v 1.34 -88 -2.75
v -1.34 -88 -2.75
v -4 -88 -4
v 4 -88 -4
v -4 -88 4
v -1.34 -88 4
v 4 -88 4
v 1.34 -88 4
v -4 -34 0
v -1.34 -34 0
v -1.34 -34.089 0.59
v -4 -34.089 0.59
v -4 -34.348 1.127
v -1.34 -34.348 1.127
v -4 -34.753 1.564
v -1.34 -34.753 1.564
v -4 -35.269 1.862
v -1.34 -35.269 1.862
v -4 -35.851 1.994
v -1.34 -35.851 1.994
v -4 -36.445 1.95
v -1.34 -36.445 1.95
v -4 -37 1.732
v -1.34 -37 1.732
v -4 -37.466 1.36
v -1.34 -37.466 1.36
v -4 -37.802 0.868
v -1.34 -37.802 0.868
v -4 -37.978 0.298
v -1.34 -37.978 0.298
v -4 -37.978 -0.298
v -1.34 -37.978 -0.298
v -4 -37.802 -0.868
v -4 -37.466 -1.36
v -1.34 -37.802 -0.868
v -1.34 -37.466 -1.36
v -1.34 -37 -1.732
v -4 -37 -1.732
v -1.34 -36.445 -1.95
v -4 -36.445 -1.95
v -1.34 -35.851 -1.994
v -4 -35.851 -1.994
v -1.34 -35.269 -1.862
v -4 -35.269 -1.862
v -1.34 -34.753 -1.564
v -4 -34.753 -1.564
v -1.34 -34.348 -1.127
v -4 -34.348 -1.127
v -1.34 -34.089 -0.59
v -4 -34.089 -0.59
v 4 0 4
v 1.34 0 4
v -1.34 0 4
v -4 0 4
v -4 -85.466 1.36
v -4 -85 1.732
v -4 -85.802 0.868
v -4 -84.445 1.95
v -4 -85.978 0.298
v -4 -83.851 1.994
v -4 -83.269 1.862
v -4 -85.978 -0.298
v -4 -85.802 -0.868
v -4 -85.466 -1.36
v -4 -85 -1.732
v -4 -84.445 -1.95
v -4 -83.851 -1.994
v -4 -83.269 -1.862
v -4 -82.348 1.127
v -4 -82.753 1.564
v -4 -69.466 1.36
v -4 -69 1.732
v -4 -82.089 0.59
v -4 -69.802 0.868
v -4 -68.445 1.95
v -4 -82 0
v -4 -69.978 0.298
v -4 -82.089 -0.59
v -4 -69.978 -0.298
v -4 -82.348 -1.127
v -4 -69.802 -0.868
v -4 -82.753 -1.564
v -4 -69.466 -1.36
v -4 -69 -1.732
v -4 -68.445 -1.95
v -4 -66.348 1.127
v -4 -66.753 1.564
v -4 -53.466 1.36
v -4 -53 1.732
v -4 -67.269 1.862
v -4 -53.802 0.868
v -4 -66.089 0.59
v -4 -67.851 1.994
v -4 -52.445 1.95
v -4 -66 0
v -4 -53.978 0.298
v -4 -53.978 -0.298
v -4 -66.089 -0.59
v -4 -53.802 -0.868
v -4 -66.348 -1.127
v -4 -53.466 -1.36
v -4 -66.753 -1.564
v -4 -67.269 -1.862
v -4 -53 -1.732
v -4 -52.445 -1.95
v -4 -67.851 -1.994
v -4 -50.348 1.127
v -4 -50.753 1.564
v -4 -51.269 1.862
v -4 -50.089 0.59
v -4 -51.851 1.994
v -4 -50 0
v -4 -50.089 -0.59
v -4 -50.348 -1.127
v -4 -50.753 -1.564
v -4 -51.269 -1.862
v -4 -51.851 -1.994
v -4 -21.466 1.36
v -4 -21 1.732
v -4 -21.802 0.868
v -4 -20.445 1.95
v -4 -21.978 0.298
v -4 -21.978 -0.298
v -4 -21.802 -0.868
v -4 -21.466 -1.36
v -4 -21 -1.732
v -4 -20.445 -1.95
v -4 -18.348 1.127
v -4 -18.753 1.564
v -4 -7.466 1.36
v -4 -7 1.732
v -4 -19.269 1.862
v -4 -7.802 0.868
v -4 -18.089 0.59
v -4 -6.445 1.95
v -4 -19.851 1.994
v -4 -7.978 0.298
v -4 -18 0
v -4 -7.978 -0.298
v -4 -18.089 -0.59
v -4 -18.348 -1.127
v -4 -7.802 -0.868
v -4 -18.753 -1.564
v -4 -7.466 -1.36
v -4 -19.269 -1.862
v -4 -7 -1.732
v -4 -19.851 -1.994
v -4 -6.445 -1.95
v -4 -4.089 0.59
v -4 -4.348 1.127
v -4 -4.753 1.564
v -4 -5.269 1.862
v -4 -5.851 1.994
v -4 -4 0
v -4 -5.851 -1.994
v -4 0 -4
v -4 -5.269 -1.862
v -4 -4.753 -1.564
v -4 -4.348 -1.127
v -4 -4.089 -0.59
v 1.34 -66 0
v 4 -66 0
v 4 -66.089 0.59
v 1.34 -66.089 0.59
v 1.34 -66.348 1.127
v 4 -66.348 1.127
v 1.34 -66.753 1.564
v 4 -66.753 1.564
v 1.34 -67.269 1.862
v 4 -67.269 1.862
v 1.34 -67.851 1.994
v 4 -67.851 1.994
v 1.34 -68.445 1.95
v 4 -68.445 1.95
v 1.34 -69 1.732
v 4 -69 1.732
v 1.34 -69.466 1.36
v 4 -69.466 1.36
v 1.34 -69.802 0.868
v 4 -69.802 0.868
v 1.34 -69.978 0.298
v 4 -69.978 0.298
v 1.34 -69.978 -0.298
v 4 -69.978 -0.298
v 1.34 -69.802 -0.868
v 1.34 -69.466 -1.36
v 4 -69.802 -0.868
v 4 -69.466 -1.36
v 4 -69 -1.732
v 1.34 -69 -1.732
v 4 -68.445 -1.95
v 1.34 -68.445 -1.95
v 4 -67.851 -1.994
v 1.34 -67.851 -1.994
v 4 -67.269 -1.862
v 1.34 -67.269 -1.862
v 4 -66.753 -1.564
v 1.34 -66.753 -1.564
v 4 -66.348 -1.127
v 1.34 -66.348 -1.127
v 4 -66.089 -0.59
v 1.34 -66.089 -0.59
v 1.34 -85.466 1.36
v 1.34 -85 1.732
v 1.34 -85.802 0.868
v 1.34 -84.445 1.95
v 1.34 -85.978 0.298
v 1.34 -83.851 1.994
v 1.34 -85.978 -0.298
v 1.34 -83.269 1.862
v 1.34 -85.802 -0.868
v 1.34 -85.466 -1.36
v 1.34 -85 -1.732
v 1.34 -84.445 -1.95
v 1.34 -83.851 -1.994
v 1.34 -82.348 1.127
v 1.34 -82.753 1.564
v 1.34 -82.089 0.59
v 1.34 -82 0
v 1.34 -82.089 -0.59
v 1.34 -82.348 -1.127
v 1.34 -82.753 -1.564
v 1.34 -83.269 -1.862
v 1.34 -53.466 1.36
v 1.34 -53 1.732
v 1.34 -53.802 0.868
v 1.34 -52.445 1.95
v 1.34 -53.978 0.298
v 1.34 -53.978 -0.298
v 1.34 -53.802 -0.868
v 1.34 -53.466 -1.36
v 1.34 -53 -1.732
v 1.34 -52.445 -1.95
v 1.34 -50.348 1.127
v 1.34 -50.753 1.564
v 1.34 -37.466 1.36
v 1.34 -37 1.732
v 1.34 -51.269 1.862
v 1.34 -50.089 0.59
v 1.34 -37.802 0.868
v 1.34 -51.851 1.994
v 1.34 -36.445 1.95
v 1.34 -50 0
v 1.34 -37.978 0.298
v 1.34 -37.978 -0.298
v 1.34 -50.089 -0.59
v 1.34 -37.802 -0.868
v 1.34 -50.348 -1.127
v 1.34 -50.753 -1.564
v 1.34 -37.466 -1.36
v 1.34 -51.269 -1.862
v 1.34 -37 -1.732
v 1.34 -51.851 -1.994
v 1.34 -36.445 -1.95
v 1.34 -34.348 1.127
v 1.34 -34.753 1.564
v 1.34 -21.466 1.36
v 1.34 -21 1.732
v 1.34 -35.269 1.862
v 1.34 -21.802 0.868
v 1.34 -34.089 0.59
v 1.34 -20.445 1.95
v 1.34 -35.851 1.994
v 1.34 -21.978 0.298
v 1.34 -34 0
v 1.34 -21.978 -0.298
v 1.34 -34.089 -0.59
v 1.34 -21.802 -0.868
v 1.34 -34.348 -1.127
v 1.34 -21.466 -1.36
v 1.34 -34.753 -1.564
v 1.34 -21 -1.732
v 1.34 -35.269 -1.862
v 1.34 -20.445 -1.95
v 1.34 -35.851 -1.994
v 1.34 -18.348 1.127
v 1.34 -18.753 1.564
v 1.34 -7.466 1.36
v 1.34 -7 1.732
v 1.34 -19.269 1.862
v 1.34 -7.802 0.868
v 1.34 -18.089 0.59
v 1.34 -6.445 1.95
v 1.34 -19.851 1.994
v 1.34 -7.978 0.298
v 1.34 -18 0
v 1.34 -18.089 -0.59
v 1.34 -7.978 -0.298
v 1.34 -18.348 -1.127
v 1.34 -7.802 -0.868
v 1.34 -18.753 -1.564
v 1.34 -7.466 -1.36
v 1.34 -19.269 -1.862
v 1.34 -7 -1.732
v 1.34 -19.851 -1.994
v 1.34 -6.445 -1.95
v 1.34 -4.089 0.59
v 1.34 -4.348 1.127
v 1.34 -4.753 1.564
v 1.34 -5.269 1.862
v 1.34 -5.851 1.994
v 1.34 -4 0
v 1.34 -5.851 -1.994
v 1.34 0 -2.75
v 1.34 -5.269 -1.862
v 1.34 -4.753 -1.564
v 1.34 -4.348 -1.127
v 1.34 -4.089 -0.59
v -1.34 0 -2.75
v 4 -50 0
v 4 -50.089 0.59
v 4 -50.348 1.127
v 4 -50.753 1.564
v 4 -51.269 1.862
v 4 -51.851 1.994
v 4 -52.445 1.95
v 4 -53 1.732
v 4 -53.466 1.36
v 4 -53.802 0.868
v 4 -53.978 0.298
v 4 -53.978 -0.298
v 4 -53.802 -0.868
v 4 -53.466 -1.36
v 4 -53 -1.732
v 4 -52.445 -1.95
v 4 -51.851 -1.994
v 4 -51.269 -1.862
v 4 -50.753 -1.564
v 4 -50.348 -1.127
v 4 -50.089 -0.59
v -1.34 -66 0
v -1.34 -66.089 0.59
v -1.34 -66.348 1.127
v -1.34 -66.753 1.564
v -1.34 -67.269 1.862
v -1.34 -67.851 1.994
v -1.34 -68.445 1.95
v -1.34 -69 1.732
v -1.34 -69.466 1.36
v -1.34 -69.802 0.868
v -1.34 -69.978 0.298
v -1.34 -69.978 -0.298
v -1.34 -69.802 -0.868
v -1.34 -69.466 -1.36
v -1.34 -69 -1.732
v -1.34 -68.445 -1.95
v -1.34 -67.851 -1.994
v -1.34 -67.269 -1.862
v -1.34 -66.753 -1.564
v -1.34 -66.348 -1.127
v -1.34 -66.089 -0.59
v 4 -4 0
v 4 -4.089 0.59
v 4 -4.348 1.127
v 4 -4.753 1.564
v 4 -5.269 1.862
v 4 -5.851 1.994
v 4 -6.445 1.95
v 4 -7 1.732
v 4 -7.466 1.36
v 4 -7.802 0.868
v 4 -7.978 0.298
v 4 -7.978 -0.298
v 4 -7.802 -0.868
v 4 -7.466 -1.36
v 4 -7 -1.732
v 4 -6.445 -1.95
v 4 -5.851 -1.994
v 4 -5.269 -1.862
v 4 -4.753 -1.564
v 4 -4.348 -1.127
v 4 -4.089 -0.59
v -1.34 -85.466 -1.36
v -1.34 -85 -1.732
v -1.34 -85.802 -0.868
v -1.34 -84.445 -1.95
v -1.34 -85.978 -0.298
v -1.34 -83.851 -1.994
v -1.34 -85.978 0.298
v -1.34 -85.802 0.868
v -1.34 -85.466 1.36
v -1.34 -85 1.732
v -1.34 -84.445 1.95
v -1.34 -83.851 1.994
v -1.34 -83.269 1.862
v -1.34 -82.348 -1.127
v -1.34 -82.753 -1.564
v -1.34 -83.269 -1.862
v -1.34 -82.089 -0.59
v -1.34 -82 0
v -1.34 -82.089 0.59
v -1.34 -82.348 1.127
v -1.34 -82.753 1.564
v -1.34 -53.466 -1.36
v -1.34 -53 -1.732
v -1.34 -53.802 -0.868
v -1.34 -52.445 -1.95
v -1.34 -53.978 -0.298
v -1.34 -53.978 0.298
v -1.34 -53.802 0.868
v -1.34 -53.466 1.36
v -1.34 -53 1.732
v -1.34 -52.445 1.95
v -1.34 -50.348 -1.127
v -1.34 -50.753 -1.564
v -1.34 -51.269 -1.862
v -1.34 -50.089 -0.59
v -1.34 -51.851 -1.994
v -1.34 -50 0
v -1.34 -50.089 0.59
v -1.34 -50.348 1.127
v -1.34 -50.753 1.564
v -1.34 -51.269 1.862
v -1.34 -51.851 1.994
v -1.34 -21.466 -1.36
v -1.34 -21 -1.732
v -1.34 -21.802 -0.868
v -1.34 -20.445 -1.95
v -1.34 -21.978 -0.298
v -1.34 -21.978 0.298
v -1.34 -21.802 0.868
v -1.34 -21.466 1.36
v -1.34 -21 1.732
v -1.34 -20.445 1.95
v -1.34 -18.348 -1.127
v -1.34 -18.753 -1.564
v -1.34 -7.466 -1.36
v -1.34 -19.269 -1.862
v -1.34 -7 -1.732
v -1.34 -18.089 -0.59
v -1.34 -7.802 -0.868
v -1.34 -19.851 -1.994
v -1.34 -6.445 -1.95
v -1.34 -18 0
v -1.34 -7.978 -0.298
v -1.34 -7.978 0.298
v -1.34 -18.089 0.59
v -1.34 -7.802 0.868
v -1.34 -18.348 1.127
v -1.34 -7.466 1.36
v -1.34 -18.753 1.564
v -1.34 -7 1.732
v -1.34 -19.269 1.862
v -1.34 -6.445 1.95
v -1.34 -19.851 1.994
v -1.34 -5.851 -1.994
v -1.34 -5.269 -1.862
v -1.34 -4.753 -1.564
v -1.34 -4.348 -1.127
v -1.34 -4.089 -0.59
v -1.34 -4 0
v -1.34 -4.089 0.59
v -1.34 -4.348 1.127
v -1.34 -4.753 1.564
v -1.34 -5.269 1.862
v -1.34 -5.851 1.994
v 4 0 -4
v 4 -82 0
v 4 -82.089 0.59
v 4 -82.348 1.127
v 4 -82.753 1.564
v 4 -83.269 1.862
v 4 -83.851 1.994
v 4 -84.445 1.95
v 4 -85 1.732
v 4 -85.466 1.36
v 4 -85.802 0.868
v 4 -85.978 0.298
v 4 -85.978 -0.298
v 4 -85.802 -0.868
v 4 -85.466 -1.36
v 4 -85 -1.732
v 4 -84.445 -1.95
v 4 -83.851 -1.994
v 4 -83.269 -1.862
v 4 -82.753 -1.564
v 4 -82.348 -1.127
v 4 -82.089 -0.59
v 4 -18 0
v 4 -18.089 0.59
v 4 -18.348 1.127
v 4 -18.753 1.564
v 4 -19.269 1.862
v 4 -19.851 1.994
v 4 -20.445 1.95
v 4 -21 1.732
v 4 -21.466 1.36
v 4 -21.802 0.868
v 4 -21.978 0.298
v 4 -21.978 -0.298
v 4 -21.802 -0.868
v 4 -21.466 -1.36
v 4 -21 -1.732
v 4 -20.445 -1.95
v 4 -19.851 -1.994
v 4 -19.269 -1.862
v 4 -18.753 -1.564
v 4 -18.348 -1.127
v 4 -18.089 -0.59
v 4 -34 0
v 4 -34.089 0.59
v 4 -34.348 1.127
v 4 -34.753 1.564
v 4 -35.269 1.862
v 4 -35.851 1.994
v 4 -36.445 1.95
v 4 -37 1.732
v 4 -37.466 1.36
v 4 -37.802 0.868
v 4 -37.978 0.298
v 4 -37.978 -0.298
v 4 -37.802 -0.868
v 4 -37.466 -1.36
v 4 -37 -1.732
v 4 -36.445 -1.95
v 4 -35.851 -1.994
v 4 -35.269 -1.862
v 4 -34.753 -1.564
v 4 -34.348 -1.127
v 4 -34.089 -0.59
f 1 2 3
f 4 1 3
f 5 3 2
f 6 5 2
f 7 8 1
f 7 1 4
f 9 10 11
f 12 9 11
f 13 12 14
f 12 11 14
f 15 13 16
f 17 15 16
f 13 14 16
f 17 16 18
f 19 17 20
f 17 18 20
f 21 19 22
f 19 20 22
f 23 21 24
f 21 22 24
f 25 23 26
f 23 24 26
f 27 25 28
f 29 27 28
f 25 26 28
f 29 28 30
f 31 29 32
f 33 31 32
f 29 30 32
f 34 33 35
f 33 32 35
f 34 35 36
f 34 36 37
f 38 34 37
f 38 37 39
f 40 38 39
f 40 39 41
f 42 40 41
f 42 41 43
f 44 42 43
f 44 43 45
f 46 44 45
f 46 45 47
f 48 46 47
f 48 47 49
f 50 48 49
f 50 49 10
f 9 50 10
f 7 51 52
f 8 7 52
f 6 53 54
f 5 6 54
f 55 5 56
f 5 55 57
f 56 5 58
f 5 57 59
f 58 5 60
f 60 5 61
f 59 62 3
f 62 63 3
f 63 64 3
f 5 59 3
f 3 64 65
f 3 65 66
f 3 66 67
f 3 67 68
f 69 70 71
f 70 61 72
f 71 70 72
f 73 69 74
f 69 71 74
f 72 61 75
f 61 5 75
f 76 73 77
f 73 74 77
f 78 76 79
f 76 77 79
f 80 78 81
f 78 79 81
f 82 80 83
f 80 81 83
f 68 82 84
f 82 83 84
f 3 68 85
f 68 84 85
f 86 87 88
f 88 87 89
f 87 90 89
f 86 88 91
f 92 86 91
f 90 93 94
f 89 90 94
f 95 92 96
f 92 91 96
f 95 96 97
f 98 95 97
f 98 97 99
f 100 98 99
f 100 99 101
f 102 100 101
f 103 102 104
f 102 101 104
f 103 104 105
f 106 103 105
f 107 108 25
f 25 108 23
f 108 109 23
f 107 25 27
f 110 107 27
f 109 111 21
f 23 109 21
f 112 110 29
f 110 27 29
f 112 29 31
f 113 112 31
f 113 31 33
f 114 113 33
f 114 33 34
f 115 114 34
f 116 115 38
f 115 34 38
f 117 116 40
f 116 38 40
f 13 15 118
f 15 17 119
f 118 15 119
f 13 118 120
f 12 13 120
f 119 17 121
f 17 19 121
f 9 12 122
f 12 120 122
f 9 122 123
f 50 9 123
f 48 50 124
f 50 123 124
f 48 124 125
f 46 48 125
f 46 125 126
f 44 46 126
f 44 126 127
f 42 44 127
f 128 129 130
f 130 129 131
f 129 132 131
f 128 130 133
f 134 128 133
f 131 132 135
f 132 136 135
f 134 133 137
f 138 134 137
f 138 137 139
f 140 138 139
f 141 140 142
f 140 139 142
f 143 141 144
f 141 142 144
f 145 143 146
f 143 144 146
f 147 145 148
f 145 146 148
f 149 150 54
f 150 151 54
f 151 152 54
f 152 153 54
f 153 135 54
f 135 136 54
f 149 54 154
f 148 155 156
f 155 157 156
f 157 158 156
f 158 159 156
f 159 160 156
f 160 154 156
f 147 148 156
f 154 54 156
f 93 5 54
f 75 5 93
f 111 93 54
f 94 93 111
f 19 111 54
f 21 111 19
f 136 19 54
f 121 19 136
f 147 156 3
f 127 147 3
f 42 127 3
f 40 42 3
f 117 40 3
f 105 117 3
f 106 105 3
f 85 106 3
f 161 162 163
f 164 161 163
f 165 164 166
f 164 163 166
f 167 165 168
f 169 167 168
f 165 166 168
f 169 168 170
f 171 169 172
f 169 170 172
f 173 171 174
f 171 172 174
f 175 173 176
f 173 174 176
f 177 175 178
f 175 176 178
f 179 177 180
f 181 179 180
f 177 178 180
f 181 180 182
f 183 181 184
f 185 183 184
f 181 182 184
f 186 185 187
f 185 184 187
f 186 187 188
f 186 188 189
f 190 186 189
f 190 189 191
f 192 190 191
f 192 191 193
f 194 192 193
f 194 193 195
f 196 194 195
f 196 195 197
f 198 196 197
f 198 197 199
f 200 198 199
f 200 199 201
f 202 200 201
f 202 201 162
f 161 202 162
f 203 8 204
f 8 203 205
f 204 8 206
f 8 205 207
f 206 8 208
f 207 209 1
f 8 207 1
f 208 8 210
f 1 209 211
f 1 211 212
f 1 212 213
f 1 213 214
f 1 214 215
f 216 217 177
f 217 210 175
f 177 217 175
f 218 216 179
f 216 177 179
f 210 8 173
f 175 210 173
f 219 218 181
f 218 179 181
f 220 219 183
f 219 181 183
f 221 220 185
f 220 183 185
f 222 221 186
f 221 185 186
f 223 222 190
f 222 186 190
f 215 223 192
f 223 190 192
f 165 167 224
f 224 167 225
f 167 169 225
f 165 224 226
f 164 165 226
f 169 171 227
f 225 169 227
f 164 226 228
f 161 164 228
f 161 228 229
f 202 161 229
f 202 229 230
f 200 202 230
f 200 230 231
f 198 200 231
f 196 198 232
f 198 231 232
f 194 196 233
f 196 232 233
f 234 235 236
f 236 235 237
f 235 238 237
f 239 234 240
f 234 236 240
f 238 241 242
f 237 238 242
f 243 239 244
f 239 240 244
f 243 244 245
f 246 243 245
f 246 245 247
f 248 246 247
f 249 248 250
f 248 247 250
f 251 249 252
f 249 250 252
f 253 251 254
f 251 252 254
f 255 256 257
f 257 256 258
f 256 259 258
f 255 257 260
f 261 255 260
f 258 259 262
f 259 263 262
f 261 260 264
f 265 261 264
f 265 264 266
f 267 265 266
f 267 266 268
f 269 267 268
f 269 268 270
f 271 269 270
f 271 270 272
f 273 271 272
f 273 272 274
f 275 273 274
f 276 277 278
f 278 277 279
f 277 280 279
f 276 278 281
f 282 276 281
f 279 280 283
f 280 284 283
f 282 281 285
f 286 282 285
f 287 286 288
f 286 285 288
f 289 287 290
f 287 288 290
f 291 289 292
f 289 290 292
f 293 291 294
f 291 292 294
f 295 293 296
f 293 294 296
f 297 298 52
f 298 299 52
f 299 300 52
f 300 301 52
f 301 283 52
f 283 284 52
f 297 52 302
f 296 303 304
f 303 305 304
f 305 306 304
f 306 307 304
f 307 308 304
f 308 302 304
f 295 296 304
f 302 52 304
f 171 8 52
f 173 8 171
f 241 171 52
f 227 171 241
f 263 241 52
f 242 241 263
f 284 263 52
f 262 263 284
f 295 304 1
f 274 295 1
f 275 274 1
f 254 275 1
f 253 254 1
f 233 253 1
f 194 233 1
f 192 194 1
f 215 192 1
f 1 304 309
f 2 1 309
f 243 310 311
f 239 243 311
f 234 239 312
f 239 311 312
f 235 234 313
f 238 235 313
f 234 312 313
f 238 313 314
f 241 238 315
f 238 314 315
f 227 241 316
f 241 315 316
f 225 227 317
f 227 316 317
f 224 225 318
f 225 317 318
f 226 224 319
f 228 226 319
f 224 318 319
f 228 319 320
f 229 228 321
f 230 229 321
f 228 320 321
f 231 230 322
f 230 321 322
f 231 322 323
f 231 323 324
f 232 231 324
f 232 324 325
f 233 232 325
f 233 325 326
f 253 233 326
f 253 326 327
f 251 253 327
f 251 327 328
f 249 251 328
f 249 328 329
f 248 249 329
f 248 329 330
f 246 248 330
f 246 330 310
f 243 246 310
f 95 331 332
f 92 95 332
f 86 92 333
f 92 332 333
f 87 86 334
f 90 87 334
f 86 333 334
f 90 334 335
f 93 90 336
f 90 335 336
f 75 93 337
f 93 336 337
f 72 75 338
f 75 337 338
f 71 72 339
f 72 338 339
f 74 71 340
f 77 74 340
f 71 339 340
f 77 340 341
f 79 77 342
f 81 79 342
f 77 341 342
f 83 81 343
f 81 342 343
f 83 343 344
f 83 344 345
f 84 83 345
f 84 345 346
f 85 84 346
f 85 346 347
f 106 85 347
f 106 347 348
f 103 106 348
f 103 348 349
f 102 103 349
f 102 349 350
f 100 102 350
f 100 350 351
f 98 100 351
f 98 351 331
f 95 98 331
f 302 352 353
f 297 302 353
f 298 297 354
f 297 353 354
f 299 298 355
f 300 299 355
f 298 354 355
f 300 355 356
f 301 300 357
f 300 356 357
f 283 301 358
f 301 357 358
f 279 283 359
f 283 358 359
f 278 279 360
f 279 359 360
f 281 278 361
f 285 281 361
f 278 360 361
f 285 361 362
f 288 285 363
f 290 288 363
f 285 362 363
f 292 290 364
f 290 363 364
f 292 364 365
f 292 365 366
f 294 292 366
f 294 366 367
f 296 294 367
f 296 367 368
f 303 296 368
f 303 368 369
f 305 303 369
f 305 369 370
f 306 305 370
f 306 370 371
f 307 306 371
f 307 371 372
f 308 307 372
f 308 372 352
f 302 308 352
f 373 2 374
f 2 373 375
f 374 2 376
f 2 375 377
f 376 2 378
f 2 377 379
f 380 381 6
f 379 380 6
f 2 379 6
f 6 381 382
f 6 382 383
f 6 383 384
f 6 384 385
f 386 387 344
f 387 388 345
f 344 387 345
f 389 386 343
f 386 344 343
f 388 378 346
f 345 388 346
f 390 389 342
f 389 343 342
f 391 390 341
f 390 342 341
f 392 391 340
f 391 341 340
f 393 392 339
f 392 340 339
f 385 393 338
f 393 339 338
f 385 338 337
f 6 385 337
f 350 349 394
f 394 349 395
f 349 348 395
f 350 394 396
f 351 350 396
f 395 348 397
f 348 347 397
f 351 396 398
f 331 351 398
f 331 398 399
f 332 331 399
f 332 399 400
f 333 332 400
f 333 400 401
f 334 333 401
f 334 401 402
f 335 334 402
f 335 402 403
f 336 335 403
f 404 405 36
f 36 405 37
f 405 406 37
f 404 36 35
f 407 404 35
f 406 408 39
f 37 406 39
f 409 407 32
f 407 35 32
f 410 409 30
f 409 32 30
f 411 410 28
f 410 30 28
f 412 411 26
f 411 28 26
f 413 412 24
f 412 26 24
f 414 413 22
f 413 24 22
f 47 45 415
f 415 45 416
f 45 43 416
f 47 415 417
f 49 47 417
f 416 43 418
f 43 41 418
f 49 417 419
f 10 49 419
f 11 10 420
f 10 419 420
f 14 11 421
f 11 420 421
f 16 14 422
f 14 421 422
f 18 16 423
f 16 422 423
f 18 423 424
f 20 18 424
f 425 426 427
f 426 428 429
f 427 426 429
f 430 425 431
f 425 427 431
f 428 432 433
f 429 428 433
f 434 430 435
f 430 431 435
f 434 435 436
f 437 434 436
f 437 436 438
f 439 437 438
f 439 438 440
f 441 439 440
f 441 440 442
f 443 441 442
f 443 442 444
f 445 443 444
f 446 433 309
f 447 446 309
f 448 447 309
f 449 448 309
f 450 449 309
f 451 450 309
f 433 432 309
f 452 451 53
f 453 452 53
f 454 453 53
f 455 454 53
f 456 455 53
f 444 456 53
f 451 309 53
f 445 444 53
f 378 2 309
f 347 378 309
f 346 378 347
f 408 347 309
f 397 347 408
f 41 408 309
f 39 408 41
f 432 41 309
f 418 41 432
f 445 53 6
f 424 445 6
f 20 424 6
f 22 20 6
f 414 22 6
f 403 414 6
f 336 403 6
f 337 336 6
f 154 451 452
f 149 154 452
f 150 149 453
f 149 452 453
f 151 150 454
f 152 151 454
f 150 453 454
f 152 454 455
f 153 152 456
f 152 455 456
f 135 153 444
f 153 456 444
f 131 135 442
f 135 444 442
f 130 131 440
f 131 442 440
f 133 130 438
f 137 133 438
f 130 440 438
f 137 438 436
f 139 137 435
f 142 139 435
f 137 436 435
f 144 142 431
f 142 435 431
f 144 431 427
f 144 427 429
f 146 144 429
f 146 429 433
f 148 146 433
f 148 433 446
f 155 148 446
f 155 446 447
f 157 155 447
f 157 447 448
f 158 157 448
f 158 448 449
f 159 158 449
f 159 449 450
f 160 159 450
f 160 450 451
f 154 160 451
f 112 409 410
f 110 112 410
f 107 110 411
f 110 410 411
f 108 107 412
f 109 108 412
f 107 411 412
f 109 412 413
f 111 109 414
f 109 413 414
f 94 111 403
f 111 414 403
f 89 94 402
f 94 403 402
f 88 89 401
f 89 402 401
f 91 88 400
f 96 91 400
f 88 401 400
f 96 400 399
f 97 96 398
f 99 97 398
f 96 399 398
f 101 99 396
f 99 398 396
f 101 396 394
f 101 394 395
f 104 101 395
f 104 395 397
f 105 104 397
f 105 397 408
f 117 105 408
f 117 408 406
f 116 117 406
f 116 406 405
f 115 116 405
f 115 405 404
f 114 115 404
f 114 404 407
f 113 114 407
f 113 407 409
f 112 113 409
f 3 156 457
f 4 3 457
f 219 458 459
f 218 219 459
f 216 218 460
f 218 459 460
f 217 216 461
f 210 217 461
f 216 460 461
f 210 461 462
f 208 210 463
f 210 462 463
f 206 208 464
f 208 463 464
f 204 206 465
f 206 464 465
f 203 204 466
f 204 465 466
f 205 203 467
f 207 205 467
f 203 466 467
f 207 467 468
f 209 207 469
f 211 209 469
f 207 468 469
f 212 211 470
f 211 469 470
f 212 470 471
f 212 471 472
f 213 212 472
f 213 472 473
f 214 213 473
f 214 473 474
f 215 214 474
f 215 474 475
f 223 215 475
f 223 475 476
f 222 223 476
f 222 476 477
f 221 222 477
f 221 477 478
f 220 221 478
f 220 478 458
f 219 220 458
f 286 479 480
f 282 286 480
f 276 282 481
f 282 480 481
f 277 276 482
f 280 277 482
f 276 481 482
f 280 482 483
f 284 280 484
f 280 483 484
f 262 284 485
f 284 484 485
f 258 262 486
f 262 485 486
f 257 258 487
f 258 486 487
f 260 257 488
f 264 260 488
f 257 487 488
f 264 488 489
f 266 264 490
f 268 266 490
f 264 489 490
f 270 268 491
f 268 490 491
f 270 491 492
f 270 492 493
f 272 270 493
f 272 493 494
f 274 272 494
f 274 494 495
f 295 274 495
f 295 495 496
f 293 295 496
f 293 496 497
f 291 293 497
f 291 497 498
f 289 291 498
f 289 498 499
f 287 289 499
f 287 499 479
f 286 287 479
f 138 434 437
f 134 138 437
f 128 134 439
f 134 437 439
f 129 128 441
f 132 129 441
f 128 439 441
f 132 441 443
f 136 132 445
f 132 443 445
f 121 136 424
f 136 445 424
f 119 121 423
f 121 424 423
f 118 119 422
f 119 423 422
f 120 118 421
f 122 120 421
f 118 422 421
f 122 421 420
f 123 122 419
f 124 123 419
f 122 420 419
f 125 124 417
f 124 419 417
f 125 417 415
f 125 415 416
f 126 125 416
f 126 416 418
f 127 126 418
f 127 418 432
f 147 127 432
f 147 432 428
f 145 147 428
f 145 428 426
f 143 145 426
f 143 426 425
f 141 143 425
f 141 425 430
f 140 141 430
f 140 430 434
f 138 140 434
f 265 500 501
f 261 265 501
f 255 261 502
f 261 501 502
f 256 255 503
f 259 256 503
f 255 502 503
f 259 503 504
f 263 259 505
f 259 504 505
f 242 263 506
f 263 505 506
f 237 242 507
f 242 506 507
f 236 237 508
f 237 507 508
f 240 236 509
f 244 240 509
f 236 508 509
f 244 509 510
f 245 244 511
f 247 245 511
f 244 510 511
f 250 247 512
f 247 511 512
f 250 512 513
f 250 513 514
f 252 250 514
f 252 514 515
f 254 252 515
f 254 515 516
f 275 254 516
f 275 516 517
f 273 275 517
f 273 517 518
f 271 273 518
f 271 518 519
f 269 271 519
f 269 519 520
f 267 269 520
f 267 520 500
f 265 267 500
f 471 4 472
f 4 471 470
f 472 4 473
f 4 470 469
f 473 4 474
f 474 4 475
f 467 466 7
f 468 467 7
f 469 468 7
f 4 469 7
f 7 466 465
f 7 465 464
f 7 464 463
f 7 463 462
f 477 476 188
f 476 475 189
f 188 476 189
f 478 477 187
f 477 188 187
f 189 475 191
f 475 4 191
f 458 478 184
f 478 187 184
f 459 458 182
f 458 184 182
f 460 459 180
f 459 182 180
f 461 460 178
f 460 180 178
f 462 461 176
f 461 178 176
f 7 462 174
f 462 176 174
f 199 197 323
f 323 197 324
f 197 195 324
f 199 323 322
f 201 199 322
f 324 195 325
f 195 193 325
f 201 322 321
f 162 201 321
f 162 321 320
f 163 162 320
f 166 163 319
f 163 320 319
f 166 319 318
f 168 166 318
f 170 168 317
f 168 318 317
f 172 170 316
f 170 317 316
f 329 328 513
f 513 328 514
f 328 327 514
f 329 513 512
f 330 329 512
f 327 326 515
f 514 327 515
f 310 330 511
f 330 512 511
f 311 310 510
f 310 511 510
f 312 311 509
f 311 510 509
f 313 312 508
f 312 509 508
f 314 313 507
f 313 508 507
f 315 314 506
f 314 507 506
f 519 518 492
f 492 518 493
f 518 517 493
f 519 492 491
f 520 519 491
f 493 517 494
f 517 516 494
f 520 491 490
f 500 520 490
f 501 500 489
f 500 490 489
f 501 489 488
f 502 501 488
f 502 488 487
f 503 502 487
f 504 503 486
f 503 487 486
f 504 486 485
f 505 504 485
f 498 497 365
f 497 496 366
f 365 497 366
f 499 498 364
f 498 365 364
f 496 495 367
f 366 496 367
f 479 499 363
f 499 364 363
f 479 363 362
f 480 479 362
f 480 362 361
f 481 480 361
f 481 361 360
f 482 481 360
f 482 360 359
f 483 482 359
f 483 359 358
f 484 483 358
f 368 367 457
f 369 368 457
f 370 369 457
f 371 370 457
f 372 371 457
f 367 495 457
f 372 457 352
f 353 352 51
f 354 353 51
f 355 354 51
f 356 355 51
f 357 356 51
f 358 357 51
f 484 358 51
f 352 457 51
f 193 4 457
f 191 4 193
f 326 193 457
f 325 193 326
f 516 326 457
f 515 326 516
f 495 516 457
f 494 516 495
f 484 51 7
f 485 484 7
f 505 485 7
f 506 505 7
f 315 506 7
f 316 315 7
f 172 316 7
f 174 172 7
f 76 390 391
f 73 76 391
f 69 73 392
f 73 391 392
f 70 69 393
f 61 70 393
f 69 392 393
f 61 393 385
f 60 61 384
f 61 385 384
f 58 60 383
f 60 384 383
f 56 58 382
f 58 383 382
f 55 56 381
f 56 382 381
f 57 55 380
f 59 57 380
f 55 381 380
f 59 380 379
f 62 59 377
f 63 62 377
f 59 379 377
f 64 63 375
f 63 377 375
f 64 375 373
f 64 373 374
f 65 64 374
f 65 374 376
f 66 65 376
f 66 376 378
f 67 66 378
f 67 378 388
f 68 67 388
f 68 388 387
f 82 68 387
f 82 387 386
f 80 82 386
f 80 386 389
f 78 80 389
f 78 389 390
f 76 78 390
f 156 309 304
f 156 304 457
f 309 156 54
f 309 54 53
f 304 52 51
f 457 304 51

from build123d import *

# Parameters (mm, degrees)
F1_DEPTH = 88
F2_R     = 2
F3_DEPTH = 8.1


with BuildPart() as f1:
    # F0 (on Front) → F1 (new body)
    with BuildSketch(Plane.XZ):
        Polygon((-1.34, 4), (-4, 4), (-4, -4), (4, -4), (4, 4), (1.34, 4), (1.34, -2.75), (-1.34, -2.75), align=None)
    extrude(amount=F1_DEPTH)

    # F2 (on face) → F3 (cut)
    with BuildSketch(Plane.YZ.offset(4)):
        with Locations((-84, 0)):
            Circle(F2_R)
        with Locations((-68, 0)):
            Circle(F2_R)
        with Locations((-52, 0)):
            Circle(F2_R)
        with Locations((-36, 0)):
            Circle(F2_R)
        with Locations((-20, 0)):
            Circle(F2_R)
        with Locations((-6, 0)):
            Circle(F2_R)
    extrude(amount=-F3_DEPTH, mode=Mode.SUBTRACT)


solid = f1.part
